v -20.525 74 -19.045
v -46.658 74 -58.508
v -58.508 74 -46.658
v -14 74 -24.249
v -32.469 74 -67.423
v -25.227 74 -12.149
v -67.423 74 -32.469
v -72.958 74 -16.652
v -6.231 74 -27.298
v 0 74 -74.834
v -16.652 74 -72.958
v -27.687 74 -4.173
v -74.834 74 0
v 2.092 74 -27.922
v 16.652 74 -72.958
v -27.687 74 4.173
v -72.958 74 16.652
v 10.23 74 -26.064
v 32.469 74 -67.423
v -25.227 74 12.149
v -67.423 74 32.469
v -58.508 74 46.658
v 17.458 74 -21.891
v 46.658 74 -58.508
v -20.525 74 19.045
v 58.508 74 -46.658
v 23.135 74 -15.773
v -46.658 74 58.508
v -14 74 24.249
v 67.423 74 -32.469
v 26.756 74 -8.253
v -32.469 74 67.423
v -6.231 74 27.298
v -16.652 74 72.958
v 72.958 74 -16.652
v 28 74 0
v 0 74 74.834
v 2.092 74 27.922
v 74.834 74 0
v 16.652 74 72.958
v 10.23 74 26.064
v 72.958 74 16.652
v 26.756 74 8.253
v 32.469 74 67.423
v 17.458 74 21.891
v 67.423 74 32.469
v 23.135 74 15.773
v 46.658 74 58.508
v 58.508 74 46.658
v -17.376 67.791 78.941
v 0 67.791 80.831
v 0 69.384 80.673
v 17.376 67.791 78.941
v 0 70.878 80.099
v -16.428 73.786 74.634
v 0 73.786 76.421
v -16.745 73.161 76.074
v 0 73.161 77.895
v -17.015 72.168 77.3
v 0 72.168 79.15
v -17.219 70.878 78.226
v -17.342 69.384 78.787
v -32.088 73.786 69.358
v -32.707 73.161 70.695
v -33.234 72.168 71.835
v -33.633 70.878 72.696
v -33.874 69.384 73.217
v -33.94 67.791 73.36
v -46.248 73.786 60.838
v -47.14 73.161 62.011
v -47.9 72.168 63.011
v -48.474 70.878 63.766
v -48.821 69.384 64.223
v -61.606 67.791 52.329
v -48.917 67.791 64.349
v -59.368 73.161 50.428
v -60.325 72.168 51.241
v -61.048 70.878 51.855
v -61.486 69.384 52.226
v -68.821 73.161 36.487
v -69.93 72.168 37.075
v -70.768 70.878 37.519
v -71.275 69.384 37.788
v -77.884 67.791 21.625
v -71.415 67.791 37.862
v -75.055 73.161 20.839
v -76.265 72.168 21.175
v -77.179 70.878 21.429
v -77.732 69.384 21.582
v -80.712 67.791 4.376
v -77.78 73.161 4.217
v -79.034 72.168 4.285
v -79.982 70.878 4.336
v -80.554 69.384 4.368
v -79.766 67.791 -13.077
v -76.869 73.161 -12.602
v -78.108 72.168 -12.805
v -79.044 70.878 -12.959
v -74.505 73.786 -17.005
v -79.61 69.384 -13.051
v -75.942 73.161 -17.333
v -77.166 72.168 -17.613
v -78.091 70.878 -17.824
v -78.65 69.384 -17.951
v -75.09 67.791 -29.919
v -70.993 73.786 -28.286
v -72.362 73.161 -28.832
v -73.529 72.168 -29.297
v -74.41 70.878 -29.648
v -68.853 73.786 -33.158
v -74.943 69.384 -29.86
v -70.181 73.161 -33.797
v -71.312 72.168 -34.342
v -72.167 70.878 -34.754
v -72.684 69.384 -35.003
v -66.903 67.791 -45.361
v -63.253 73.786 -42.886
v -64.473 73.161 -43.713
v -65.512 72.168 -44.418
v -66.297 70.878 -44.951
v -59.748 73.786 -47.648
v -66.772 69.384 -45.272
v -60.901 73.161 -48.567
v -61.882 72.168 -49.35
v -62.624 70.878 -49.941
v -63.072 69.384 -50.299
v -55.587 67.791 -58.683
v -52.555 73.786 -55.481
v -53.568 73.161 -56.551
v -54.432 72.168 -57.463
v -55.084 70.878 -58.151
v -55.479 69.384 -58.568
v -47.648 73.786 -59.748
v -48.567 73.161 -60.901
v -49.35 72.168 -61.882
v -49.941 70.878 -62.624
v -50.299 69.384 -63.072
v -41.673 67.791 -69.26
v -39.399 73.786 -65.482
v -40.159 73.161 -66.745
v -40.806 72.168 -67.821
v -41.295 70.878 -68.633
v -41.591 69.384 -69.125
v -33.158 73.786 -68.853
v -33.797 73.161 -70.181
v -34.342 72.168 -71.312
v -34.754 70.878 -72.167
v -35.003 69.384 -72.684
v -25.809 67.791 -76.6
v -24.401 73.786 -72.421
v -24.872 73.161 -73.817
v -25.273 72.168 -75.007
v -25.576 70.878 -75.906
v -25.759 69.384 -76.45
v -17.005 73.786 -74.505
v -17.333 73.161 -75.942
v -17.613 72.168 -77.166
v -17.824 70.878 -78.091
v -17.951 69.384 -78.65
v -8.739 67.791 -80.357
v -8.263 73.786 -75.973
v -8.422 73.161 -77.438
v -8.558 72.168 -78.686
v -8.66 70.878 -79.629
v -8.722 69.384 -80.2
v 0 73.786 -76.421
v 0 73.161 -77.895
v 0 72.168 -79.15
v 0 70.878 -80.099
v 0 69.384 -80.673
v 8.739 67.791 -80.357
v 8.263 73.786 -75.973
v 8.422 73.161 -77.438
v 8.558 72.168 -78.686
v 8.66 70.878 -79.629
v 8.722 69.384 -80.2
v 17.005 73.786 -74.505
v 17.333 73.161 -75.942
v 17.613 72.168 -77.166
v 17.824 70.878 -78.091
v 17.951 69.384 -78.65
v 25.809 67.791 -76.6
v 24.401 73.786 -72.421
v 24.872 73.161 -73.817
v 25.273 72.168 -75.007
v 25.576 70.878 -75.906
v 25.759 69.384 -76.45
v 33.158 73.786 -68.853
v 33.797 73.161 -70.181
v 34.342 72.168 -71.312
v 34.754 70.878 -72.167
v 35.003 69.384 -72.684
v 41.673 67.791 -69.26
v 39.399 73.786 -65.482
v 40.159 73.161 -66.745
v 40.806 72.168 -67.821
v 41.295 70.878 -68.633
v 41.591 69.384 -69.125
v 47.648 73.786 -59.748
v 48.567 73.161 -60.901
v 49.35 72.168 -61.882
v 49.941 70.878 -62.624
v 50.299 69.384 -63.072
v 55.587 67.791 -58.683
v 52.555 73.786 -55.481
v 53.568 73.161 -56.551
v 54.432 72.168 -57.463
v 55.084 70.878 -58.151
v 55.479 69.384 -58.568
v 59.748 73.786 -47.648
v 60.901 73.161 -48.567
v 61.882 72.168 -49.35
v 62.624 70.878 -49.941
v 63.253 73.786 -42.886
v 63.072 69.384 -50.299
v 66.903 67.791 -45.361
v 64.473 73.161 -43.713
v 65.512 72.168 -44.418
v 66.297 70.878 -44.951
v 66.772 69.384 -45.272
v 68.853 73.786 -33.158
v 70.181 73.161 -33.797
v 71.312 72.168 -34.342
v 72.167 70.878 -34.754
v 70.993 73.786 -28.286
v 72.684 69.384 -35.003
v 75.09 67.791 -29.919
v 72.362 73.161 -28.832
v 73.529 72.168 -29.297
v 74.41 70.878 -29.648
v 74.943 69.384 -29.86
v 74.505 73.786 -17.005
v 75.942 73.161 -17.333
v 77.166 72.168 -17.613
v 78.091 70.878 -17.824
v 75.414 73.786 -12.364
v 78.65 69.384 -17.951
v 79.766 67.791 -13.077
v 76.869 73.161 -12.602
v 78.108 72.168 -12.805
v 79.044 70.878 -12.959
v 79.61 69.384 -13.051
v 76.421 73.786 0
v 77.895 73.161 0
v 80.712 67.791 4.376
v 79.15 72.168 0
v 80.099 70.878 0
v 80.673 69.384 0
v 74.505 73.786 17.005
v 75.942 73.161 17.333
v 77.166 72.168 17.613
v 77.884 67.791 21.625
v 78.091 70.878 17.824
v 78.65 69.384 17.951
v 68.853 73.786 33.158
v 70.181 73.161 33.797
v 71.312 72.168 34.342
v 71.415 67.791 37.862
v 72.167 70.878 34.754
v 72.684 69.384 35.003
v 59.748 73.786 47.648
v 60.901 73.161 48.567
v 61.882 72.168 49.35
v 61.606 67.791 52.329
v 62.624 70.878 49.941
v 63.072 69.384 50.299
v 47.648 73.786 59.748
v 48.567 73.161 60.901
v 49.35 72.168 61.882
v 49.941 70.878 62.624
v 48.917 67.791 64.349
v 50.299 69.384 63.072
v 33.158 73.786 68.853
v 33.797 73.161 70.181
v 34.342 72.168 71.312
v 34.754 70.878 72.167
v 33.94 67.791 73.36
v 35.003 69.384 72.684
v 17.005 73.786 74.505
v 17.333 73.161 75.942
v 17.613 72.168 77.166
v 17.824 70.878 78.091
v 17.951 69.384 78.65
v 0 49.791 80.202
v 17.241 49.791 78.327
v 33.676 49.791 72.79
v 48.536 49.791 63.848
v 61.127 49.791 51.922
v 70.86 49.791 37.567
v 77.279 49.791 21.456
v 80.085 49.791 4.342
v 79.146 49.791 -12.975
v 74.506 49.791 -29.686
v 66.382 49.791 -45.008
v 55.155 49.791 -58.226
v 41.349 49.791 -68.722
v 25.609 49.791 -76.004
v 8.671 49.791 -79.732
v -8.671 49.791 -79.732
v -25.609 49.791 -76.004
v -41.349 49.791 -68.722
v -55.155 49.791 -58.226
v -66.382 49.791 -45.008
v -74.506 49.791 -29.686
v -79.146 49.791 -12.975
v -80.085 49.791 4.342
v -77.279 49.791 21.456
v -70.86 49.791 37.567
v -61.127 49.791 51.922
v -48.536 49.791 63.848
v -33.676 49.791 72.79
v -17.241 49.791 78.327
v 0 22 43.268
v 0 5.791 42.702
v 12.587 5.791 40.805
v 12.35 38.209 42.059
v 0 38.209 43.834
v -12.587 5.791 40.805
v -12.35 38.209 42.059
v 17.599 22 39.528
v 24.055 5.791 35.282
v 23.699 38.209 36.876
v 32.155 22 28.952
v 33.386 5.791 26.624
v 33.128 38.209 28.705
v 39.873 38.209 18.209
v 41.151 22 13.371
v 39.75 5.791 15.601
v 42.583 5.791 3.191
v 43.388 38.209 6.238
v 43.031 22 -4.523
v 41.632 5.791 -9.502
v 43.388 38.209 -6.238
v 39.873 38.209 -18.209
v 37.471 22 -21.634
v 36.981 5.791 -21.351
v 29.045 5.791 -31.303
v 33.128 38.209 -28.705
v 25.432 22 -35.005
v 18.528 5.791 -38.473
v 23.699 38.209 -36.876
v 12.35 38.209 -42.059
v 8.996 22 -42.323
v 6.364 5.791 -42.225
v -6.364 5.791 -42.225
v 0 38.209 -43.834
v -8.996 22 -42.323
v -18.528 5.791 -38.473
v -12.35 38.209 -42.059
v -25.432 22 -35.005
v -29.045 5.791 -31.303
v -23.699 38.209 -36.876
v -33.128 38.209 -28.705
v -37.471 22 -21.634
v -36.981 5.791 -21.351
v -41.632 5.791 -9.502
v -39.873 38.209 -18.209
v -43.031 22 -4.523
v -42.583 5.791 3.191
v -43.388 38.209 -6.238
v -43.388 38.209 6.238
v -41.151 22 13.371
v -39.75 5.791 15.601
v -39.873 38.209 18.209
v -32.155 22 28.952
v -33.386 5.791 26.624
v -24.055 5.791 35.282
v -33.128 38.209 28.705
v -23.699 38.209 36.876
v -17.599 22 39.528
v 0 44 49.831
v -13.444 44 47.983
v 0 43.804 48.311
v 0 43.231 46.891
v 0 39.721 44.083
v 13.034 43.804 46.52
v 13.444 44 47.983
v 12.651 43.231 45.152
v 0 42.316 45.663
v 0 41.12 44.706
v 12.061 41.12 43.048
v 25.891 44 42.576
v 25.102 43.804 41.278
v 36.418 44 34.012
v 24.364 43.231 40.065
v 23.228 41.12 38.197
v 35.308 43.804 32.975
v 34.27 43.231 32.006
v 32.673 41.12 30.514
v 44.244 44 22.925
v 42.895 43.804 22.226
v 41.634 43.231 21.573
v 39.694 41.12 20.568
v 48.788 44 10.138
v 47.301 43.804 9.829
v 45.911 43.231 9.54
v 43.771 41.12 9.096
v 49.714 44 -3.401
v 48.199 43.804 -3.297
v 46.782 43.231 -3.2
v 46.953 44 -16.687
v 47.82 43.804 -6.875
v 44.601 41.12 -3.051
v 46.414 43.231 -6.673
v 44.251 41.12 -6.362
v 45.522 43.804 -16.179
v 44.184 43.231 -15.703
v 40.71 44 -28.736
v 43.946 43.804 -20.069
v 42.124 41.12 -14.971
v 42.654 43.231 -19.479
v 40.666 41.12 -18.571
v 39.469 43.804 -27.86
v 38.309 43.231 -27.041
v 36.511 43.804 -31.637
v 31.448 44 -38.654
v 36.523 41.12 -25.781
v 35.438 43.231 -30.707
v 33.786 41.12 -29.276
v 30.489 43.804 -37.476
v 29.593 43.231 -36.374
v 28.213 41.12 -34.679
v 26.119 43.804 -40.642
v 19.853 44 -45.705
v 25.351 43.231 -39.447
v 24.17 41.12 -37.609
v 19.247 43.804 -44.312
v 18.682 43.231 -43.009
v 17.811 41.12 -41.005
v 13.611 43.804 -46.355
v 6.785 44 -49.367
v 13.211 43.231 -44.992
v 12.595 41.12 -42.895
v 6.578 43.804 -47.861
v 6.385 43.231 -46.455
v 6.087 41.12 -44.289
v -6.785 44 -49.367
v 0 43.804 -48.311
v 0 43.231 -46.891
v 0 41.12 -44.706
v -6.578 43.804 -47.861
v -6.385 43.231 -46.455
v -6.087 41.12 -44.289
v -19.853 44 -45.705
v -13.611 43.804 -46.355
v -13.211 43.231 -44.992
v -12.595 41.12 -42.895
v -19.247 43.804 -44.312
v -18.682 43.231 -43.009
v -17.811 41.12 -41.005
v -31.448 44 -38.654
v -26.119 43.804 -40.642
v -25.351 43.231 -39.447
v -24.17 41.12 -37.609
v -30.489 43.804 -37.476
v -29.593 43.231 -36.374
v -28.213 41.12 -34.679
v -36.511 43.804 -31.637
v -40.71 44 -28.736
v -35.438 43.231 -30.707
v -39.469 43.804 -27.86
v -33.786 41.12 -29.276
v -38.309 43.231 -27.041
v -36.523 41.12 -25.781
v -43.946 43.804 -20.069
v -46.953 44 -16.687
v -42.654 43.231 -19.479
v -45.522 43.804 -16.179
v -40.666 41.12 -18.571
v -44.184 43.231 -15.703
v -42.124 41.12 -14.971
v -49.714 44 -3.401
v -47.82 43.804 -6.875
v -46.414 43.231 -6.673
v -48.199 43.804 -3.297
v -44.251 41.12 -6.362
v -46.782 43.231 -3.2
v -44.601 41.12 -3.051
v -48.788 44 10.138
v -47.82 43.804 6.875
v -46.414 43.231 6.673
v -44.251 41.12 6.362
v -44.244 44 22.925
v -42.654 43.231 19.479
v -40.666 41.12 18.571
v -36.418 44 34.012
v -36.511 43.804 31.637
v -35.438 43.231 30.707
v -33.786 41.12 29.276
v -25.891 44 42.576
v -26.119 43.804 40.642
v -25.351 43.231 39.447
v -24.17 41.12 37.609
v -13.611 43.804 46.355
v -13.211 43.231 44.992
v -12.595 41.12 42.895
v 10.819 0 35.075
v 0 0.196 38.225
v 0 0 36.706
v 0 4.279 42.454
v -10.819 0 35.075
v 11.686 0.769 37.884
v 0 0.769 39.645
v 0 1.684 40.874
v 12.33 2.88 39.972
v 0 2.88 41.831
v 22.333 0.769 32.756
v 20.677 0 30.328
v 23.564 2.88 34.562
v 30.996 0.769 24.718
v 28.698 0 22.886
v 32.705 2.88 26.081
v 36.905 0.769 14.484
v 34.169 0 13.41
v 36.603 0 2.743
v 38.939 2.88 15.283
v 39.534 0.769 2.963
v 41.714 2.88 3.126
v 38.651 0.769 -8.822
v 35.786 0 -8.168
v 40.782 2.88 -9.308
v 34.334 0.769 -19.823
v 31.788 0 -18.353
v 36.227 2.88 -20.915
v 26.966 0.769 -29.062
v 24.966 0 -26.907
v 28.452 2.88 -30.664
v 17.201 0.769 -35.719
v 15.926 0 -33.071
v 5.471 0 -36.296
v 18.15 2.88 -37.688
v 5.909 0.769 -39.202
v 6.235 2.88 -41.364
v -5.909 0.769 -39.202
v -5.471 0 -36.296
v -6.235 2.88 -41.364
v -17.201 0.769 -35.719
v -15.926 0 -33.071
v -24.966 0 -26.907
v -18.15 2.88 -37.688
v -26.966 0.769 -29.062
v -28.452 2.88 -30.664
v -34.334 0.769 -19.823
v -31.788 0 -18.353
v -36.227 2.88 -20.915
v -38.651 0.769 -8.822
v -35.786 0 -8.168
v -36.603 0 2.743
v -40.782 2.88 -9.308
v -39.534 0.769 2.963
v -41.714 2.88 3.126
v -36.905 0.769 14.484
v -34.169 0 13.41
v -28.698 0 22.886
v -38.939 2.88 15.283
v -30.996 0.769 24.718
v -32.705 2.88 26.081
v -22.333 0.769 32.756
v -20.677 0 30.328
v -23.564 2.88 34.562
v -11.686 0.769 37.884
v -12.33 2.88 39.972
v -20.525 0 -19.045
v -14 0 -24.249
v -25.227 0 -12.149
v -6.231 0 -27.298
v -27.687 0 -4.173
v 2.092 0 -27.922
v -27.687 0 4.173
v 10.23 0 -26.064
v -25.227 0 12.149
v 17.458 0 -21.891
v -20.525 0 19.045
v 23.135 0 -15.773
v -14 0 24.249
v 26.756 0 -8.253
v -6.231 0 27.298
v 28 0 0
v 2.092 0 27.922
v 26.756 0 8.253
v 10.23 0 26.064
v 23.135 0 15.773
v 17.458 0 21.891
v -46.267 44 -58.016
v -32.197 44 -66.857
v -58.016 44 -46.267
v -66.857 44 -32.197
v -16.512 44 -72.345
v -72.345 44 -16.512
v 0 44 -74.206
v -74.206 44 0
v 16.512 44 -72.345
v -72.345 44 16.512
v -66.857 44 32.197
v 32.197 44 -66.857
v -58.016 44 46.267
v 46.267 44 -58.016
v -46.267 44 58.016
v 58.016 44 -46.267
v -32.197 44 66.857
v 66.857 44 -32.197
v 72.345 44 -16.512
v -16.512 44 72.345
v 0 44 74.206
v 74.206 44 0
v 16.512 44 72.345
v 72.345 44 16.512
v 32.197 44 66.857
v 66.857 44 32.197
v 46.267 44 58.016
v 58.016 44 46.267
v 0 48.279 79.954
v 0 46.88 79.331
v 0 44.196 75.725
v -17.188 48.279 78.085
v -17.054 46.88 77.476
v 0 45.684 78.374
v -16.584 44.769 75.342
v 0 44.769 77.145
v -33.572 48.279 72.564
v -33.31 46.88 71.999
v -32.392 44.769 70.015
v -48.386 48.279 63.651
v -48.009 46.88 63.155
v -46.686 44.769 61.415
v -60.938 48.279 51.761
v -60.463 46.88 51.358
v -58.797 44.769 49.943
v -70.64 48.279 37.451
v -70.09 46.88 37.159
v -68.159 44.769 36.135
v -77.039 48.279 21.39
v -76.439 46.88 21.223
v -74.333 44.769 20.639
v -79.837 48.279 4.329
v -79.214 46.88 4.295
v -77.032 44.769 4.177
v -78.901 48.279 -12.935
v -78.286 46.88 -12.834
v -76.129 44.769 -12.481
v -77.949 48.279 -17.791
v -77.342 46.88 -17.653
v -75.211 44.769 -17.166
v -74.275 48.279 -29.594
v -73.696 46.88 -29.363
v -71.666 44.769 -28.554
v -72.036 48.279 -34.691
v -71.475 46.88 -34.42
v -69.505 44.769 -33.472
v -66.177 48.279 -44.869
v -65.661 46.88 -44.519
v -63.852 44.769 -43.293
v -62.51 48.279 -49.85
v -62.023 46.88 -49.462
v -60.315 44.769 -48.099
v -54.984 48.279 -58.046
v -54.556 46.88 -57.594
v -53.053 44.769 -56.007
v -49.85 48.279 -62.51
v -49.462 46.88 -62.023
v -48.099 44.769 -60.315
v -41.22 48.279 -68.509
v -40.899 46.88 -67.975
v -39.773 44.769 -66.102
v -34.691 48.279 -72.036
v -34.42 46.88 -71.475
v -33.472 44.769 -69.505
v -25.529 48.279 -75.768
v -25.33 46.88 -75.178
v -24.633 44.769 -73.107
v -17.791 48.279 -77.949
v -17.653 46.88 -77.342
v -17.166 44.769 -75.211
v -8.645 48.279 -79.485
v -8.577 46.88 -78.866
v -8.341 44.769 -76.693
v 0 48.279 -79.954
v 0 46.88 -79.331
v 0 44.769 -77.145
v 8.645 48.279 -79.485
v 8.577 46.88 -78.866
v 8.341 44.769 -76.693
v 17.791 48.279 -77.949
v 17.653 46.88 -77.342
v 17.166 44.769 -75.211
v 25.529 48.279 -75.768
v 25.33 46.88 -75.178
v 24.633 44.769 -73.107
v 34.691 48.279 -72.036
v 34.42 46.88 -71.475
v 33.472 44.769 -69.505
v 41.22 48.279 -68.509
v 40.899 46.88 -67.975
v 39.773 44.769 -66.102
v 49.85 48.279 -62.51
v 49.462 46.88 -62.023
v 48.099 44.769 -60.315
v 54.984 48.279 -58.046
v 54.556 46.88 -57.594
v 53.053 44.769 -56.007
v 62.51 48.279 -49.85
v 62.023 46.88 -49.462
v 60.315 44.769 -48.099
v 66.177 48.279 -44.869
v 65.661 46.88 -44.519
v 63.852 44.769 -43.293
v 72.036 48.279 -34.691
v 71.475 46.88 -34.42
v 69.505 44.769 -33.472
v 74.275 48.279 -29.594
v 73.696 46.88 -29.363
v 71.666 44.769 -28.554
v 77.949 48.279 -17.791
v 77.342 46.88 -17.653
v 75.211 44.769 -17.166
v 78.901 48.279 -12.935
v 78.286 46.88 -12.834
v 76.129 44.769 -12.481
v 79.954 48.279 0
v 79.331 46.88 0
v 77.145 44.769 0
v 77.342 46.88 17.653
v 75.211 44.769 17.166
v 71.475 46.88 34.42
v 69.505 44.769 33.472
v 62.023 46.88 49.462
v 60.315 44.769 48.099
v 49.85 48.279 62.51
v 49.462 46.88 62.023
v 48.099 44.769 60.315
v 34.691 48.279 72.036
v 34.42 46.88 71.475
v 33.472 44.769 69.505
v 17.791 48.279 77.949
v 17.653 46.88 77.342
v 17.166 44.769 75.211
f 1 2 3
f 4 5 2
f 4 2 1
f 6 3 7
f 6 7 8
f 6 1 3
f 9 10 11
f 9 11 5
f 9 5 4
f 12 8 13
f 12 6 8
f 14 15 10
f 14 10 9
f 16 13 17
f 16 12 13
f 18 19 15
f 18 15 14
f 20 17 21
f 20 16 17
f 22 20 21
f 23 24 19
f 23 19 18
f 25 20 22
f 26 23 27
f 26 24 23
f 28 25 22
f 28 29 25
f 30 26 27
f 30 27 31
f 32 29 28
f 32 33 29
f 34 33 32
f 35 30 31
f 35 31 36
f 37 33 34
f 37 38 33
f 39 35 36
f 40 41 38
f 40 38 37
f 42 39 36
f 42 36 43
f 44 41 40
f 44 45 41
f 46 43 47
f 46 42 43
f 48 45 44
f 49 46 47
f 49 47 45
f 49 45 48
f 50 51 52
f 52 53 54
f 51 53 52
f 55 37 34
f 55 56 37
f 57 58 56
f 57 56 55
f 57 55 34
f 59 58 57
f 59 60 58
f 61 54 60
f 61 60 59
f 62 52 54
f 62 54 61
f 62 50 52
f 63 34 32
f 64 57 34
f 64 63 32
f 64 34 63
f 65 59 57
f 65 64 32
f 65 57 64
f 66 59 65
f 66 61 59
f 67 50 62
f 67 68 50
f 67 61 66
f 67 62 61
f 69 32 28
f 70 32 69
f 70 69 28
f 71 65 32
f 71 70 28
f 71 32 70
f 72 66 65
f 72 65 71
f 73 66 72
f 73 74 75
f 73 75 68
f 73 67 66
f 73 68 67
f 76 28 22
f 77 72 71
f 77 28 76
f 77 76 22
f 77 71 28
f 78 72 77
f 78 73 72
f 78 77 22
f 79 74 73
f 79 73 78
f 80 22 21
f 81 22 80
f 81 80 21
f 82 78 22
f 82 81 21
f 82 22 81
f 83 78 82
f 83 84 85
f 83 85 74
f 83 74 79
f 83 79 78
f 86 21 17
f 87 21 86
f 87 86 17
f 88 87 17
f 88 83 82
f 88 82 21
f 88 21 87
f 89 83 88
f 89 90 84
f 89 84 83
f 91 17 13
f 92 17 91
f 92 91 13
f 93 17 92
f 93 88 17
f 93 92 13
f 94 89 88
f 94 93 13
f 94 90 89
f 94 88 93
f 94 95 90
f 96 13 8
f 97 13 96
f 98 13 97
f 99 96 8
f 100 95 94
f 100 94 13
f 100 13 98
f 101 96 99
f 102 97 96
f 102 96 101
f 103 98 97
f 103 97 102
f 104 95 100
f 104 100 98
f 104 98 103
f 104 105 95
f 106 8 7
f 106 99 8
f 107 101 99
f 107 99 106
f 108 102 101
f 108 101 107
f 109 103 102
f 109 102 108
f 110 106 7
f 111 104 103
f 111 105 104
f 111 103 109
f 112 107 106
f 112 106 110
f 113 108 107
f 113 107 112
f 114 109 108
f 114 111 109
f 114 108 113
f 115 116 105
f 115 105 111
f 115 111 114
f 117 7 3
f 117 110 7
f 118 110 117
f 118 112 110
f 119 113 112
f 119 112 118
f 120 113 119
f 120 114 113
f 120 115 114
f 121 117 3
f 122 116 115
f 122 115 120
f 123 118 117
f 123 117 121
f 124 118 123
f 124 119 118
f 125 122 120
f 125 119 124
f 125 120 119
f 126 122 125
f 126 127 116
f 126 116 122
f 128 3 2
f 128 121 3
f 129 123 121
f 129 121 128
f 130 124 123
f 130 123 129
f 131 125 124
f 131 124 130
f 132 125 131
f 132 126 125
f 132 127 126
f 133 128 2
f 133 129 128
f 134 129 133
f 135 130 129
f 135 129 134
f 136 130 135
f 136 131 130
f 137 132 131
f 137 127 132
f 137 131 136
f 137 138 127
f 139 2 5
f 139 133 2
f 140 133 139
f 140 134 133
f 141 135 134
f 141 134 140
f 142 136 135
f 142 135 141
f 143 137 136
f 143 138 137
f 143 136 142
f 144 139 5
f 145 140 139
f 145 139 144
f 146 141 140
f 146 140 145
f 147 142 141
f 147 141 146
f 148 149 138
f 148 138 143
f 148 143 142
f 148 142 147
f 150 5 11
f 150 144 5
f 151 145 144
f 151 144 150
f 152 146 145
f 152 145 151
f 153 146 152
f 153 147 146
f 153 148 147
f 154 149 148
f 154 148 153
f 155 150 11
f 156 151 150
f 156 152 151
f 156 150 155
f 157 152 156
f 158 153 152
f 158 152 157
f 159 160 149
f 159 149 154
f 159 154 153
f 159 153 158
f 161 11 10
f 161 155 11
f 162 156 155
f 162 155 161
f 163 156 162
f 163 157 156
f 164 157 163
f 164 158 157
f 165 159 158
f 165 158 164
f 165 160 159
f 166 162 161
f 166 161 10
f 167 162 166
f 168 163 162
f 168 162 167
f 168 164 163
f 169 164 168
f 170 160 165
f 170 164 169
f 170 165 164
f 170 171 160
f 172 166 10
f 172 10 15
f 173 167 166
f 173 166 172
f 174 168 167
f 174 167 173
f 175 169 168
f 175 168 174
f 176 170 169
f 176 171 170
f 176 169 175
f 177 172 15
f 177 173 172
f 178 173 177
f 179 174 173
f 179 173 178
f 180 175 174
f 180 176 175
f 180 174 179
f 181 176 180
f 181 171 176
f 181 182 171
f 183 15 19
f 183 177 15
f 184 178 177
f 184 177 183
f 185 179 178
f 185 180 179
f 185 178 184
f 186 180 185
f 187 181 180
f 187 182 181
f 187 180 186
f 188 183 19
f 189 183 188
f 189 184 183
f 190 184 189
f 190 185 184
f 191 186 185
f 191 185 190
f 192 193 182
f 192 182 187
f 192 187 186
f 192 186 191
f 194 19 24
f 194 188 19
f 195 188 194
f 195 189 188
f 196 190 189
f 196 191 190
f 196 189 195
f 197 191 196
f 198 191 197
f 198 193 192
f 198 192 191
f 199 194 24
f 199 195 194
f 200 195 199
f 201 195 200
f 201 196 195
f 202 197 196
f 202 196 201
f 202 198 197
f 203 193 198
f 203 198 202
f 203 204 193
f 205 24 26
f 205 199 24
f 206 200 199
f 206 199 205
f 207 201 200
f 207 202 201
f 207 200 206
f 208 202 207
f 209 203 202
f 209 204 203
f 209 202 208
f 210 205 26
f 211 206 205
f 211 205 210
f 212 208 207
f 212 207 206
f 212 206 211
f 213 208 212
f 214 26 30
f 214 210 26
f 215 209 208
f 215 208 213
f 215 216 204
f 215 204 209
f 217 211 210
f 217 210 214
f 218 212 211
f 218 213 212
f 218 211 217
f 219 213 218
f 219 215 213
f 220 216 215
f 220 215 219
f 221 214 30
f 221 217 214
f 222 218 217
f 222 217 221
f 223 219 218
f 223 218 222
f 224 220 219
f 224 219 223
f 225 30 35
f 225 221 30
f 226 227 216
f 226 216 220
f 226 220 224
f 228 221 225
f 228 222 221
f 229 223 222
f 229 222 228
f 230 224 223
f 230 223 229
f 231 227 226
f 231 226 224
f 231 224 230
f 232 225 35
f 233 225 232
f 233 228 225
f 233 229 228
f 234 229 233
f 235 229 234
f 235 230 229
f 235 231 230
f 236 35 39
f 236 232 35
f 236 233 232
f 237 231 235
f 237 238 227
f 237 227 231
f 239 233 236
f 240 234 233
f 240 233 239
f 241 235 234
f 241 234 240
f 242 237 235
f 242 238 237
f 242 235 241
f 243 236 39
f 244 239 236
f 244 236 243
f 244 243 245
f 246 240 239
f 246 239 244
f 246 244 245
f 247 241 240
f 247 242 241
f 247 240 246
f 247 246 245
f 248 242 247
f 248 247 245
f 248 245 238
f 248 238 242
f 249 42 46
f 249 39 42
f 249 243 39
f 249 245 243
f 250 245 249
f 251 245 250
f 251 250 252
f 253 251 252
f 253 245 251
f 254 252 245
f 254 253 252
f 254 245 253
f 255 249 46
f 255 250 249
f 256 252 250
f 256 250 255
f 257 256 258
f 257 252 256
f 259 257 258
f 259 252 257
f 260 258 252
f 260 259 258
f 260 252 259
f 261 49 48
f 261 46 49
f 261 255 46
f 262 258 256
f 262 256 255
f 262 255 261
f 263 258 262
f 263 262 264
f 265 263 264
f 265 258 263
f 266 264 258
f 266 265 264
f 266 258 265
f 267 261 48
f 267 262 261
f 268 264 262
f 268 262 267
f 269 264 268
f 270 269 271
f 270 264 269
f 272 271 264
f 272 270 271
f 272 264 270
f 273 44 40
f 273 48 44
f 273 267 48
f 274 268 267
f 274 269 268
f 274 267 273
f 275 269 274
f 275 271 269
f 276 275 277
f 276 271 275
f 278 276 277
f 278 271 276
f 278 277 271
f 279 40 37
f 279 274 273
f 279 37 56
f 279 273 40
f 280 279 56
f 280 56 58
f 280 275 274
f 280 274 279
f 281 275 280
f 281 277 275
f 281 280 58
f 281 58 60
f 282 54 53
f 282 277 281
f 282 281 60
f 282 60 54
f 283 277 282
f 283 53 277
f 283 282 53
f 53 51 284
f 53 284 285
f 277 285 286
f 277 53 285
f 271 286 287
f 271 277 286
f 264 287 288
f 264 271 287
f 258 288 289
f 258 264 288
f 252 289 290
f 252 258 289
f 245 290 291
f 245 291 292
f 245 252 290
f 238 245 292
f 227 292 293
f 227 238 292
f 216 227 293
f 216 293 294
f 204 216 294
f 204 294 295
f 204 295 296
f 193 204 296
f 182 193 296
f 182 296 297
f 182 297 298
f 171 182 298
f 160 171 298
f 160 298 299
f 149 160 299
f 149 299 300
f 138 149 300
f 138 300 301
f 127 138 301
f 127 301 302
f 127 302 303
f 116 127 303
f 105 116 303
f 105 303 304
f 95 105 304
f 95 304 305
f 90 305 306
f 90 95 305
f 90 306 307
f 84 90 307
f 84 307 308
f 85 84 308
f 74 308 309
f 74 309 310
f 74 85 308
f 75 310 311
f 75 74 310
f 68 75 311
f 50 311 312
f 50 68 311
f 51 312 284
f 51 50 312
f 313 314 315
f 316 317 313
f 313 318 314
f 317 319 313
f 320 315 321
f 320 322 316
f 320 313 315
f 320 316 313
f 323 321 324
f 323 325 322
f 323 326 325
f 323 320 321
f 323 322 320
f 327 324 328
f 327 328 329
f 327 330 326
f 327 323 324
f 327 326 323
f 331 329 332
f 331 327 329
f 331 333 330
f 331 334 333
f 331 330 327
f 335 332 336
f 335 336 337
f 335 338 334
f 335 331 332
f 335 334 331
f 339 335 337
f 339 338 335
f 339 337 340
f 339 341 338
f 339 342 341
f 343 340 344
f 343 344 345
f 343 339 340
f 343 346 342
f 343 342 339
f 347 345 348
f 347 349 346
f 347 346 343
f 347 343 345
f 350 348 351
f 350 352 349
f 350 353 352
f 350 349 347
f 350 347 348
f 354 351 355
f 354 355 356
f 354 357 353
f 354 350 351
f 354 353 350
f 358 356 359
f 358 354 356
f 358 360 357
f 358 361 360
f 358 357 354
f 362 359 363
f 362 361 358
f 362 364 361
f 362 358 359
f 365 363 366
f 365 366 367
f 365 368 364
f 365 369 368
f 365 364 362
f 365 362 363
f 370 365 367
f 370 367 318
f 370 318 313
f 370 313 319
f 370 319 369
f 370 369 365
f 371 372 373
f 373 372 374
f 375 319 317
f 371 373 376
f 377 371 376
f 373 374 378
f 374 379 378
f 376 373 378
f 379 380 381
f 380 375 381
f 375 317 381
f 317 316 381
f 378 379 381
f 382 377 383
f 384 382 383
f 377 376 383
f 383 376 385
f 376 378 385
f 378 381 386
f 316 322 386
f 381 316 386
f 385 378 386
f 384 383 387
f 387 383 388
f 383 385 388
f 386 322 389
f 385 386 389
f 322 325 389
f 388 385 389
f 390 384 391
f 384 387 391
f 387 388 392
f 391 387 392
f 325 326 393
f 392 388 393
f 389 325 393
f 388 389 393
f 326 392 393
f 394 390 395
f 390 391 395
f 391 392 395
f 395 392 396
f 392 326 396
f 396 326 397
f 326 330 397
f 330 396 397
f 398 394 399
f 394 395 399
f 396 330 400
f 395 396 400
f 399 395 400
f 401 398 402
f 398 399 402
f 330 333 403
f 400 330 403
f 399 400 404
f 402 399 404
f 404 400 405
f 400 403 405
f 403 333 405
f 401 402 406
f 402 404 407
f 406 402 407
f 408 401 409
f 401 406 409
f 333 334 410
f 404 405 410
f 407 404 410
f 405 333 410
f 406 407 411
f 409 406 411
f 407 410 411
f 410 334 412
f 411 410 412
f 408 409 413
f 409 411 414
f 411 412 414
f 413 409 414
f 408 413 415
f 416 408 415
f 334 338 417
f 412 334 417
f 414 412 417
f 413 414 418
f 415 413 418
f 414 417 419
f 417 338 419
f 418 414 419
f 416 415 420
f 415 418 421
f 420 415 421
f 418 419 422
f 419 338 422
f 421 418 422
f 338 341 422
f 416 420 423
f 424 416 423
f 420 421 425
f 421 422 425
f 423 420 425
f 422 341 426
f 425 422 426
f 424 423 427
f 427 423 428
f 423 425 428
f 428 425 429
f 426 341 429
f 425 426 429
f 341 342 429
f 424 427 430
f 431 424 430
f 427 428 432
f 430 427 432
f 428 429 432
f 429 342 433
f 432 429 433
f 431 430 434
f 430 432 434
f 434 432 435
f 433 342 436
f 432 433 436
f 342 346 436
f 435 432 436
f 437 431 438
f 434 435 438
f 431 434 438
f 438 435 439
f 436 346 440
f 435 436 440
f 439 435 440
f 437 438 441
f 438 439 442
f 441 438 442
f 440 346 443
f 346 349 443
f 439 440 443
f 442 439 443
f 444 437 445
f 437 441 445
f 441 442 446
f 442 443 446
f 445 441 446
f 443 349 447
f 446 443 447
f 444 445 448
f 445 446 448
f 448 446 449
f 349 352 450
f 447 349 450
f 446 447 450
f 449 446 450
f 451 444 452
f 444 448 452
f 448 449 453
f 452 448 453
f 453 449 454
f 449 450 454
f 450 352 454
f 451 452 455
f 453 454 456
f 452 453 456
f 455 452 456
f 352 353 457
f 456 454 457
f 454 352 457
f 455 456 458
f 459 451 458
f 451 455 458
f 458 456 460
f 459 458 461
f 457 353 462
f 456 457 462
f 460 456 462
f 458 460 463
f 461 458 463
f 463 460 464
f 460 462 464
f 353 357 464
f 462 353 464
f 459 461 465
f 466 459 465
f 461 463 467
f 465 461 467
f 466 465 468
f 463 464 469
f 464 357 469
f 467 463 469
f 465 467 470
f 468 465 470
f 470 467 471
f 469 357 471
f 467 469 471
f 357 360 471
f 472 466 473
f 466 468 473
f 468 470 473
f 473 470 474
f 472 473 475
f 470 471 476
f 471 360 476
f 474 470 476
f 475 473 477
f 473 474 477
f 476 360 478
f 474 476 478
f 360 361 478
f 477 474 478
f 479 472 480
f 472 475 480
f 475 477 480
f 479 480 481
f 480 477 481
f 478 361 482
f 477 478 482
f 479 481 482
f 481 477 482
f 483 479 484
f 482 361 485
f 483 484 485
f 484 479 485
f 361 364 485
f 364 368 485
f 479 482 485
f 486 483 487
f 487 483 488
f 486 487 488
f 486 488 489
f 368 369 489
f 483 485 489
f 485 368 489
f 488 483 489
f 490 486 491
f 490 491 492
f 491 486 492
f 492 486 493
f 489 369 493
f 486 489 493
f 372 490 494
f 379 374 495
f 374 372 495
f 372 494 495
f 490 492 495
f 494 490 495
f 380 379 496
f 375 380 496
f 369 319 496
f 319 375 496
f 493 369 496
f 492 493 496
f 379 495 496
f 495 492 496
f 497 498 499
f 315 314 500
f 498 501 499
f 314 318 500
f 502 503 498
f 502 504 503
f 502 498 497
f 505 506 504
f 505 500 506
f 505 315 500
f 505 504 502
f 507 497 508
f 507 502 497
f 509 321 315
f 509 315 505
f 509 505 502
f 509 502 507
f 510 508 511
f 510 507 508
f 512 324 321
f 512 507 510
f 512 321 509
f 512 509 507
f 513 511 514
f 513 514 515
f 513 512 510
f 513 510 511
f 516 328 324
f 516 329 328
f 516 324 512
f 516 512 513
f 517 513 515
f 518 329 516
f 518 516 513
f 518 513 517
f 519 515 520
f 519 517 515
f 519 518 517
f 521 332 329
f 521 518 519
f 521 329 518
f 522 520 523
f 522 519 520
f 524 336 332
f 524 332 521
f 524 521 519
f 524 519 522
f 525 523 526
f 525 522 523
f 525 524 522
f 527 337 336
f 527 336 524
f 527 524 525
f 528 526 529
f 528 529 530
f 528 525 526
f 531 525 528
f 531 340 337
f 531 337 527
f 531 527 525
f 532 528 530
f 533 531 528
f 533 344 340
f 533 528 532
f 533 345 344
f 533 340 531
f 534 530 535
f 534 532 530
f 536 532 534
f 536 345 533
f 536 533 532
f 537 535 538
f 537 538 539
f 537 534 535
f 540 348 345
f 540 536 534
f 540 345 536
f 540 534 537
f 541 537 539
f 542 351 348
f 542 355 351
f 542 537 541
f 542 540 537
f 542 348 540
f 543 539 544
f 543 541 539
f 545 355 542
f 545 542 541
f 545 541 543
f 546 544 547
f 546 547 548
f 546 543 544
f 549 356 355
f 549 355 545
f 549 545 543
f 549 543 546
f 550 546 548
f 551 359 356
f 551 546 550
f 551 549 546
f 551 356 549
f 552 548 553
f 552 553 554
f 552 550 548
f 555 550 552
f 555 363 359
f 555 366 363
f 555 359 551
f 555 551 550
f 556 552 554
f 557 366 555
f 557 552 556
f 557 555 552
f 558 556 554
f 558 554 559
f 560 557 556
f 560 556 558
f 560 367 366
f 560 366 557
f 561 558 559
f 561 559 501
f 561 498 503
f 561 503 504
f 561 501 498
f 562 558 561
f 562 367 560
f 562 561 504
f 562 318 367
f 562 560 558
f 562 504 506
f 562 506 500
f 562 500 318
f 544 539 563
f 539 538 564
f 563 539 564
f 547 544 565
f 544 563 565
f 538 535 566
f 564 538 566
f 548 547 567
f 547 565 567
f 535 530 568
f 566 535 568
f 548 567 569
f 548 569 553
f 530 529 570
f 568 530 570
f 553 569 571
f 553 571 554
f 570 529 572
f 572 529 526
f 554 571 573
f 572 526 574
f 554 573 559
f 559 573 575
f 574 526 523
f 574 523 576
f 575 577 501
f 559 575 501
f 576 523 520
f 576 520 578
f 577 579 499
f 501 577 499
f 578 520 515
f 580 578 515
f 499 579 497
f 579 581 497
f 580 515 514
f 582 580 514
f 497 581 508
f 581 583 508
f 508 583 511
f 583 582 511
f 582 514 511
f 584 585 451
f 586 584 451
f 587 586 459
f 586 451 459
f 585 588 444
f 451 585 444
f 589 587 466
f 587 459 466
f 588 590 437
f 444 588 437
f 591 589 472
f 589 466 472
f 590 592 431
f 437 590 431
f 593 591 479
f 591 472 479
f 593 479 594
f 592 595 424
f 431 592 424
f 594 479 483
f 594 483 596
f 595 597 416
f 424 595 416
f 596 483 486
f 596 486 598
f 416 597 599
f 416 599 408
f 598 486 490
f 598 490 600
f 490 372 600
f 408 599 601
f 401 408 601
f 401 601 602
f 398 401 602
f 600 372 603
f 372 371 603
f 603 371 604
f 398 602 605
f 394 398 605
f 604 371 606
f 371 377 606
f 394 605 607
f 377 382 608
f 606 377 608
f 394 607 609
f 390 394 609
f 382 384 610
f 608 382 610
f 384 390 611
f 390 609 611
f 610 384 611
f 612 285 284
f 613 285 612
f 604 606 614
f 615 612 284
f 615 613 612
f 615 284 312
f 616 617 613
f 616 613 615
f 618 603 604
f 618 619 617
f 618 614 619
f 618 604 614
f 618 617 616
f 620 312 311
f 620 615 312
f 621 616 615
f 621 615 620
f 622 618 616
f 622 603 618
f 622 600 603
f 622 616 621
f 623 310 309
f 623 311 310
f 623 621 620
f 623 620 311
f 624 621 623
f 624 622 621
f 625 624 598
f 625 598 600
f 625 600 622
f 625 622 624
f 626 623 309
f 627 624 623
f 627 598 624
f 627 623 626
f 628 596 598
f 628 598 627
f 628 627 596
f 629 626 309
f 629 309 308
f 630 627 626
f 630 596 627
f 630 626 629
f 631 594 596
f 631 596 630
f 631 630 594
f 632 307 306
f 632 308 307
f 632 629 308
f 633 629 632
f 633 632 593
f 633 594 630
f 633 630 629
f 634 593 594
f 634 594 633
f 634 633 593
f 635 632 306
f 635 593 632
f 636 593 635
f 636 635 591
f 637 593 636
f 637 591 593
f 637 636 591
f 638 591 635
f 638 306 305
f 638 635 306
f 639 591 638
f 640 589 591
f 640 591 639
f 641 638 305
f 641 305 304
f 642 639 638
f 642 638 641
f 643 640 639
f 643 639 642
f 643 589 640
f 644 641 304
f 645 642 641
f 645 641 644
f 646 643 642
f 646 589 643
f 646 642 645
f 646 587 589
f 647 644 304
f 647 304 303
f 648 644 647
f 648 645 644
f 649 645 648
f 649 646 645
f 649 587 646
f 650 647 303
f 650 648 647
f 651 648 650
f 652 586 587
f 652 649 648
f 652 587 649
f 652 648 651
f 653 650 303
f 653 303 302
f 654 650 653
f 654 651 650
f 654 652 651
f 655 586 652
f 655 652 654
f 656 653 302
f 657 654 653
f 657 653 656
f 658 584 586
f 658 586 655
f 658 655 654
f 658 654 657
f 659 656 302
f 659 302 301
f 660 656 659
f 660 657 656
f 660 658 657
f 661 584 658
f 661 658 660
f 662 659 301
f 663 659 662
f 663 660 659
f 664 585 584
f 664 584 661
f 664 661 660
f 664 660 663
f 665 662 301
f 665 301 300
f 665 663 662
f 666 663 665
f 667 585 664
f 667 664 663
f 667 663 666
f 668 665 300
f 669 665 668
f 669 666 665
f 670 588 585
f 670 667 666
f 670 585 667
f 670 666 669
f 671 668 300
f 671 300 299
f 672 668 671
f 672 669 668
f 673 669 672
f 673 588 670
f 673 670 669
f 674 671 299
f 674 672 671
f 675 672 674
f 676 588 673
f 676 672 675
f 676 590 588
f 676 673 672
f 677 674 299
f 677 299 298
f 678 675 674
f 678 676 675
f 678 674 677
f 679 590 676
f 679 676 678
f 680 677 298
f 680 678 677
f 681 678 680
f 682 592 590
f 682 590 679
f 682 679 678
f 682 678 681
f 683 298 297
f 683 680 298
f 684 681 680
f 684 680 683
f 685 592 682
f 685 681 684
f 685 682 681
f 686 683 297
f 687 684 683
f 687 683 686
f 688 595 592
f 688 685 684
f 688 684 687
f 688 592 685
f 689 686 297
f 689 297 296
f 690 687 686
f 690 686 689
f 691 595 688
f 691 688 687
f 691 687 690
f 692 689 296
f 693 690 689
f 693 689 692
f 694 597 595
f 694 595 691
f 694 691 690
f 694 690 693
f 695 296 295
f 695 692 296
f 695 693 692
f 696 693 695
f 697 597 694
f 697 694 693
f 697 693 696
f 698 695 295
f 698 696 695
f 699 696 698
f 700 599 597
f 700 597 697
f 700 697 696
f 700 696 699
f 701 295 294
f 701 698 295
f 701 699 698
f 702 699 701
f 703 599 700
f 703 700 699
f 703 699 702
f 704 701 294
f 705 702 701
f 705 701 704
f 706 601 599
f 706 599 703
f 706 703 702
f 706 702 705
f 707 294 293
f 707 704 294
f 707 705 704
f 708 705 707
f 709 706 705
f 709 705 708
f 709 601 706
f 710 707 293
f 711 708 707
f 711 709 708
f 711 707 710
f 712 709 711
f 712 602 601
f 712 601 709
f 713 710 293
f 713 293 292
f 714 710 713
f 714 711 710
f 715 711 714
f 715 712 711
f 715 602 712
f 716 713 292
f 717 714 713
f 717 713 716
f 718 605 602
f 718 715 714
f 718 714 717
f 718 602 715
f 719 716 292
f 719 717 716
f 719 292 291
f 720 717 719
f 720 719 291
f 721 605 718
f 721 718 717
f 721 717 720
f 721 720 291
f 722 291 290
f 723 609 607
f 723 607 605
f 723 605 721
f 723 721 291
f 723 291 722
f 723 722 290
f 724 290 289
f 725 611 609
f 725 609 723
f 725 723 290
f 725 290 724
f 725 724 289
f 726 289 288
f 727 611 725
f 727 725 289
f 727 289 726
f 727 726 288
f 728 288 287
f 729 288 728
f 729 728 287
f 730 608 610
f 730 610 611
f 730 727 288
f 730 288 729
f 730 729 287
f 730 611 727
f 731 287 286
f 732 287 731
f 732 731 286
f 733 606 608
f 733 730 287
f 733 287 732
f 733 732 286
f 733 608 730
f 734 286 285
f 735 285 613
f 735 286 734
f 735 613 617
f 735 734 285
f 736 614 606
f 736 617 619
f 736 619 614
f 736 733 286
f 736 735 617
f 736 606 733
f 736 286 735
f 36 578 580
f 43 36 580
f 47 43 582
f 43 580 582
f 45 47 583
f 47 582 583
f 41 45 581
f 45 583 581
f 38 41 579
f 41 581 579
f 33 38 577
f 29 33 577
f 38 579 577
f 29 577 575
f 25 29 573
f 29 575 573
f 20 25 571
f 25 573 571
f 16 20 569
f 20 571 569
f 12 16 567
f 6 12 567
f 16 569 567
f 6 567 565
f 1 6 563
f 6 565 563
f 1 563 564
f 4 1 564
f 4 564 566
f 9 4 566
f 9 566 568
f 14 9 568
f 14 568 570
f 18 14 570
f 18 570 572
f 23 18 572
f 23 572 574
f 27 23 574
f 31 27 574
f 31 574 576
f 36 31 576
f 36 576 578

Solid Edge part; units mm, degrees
sketch "Sketch1" plane through (0, 0, 0) normal (1, 0, 0) x (0, 1, 0)
  line L0 (74, 81.0476) -> (74, 0)
  line L1 (44, 80) -> (74, 81.0476)
  line L2 (44, 80) -> (44, 44.0365)
  line L3 (0, 42.5) -> (44, 44.0365)
  line L4 (0, 42.5) -> (0, 0)
  dimension "D1" = 42.5
  dimension "D2" = 35.9635
  dimension "D3" = 81.0476
  dimension "D4" = 30.0183
  dimension "D5" = 44.0268
revolve "RevolvedProtrusion1" add sketch "Sketch1" angle 360 about axis through (0, 0, 0) along (0, 1, 0)
sketch "Sketch2" plane through (0, 0, 0) normal (0, -1, 0) x (1, 0, 0)
  circle A0 centre (0, 0) radius 28
extrude "Cutout1" cut sketch "Sketch2" against normal blind 250.3843
fillet "Raccordi_grezzo" radius 6 4 edges at (0, 74, 81.0476) (0, 44, 80) (0, 44, 44.0365) (0, 0, 42.5)
properties material "Acciaio"
